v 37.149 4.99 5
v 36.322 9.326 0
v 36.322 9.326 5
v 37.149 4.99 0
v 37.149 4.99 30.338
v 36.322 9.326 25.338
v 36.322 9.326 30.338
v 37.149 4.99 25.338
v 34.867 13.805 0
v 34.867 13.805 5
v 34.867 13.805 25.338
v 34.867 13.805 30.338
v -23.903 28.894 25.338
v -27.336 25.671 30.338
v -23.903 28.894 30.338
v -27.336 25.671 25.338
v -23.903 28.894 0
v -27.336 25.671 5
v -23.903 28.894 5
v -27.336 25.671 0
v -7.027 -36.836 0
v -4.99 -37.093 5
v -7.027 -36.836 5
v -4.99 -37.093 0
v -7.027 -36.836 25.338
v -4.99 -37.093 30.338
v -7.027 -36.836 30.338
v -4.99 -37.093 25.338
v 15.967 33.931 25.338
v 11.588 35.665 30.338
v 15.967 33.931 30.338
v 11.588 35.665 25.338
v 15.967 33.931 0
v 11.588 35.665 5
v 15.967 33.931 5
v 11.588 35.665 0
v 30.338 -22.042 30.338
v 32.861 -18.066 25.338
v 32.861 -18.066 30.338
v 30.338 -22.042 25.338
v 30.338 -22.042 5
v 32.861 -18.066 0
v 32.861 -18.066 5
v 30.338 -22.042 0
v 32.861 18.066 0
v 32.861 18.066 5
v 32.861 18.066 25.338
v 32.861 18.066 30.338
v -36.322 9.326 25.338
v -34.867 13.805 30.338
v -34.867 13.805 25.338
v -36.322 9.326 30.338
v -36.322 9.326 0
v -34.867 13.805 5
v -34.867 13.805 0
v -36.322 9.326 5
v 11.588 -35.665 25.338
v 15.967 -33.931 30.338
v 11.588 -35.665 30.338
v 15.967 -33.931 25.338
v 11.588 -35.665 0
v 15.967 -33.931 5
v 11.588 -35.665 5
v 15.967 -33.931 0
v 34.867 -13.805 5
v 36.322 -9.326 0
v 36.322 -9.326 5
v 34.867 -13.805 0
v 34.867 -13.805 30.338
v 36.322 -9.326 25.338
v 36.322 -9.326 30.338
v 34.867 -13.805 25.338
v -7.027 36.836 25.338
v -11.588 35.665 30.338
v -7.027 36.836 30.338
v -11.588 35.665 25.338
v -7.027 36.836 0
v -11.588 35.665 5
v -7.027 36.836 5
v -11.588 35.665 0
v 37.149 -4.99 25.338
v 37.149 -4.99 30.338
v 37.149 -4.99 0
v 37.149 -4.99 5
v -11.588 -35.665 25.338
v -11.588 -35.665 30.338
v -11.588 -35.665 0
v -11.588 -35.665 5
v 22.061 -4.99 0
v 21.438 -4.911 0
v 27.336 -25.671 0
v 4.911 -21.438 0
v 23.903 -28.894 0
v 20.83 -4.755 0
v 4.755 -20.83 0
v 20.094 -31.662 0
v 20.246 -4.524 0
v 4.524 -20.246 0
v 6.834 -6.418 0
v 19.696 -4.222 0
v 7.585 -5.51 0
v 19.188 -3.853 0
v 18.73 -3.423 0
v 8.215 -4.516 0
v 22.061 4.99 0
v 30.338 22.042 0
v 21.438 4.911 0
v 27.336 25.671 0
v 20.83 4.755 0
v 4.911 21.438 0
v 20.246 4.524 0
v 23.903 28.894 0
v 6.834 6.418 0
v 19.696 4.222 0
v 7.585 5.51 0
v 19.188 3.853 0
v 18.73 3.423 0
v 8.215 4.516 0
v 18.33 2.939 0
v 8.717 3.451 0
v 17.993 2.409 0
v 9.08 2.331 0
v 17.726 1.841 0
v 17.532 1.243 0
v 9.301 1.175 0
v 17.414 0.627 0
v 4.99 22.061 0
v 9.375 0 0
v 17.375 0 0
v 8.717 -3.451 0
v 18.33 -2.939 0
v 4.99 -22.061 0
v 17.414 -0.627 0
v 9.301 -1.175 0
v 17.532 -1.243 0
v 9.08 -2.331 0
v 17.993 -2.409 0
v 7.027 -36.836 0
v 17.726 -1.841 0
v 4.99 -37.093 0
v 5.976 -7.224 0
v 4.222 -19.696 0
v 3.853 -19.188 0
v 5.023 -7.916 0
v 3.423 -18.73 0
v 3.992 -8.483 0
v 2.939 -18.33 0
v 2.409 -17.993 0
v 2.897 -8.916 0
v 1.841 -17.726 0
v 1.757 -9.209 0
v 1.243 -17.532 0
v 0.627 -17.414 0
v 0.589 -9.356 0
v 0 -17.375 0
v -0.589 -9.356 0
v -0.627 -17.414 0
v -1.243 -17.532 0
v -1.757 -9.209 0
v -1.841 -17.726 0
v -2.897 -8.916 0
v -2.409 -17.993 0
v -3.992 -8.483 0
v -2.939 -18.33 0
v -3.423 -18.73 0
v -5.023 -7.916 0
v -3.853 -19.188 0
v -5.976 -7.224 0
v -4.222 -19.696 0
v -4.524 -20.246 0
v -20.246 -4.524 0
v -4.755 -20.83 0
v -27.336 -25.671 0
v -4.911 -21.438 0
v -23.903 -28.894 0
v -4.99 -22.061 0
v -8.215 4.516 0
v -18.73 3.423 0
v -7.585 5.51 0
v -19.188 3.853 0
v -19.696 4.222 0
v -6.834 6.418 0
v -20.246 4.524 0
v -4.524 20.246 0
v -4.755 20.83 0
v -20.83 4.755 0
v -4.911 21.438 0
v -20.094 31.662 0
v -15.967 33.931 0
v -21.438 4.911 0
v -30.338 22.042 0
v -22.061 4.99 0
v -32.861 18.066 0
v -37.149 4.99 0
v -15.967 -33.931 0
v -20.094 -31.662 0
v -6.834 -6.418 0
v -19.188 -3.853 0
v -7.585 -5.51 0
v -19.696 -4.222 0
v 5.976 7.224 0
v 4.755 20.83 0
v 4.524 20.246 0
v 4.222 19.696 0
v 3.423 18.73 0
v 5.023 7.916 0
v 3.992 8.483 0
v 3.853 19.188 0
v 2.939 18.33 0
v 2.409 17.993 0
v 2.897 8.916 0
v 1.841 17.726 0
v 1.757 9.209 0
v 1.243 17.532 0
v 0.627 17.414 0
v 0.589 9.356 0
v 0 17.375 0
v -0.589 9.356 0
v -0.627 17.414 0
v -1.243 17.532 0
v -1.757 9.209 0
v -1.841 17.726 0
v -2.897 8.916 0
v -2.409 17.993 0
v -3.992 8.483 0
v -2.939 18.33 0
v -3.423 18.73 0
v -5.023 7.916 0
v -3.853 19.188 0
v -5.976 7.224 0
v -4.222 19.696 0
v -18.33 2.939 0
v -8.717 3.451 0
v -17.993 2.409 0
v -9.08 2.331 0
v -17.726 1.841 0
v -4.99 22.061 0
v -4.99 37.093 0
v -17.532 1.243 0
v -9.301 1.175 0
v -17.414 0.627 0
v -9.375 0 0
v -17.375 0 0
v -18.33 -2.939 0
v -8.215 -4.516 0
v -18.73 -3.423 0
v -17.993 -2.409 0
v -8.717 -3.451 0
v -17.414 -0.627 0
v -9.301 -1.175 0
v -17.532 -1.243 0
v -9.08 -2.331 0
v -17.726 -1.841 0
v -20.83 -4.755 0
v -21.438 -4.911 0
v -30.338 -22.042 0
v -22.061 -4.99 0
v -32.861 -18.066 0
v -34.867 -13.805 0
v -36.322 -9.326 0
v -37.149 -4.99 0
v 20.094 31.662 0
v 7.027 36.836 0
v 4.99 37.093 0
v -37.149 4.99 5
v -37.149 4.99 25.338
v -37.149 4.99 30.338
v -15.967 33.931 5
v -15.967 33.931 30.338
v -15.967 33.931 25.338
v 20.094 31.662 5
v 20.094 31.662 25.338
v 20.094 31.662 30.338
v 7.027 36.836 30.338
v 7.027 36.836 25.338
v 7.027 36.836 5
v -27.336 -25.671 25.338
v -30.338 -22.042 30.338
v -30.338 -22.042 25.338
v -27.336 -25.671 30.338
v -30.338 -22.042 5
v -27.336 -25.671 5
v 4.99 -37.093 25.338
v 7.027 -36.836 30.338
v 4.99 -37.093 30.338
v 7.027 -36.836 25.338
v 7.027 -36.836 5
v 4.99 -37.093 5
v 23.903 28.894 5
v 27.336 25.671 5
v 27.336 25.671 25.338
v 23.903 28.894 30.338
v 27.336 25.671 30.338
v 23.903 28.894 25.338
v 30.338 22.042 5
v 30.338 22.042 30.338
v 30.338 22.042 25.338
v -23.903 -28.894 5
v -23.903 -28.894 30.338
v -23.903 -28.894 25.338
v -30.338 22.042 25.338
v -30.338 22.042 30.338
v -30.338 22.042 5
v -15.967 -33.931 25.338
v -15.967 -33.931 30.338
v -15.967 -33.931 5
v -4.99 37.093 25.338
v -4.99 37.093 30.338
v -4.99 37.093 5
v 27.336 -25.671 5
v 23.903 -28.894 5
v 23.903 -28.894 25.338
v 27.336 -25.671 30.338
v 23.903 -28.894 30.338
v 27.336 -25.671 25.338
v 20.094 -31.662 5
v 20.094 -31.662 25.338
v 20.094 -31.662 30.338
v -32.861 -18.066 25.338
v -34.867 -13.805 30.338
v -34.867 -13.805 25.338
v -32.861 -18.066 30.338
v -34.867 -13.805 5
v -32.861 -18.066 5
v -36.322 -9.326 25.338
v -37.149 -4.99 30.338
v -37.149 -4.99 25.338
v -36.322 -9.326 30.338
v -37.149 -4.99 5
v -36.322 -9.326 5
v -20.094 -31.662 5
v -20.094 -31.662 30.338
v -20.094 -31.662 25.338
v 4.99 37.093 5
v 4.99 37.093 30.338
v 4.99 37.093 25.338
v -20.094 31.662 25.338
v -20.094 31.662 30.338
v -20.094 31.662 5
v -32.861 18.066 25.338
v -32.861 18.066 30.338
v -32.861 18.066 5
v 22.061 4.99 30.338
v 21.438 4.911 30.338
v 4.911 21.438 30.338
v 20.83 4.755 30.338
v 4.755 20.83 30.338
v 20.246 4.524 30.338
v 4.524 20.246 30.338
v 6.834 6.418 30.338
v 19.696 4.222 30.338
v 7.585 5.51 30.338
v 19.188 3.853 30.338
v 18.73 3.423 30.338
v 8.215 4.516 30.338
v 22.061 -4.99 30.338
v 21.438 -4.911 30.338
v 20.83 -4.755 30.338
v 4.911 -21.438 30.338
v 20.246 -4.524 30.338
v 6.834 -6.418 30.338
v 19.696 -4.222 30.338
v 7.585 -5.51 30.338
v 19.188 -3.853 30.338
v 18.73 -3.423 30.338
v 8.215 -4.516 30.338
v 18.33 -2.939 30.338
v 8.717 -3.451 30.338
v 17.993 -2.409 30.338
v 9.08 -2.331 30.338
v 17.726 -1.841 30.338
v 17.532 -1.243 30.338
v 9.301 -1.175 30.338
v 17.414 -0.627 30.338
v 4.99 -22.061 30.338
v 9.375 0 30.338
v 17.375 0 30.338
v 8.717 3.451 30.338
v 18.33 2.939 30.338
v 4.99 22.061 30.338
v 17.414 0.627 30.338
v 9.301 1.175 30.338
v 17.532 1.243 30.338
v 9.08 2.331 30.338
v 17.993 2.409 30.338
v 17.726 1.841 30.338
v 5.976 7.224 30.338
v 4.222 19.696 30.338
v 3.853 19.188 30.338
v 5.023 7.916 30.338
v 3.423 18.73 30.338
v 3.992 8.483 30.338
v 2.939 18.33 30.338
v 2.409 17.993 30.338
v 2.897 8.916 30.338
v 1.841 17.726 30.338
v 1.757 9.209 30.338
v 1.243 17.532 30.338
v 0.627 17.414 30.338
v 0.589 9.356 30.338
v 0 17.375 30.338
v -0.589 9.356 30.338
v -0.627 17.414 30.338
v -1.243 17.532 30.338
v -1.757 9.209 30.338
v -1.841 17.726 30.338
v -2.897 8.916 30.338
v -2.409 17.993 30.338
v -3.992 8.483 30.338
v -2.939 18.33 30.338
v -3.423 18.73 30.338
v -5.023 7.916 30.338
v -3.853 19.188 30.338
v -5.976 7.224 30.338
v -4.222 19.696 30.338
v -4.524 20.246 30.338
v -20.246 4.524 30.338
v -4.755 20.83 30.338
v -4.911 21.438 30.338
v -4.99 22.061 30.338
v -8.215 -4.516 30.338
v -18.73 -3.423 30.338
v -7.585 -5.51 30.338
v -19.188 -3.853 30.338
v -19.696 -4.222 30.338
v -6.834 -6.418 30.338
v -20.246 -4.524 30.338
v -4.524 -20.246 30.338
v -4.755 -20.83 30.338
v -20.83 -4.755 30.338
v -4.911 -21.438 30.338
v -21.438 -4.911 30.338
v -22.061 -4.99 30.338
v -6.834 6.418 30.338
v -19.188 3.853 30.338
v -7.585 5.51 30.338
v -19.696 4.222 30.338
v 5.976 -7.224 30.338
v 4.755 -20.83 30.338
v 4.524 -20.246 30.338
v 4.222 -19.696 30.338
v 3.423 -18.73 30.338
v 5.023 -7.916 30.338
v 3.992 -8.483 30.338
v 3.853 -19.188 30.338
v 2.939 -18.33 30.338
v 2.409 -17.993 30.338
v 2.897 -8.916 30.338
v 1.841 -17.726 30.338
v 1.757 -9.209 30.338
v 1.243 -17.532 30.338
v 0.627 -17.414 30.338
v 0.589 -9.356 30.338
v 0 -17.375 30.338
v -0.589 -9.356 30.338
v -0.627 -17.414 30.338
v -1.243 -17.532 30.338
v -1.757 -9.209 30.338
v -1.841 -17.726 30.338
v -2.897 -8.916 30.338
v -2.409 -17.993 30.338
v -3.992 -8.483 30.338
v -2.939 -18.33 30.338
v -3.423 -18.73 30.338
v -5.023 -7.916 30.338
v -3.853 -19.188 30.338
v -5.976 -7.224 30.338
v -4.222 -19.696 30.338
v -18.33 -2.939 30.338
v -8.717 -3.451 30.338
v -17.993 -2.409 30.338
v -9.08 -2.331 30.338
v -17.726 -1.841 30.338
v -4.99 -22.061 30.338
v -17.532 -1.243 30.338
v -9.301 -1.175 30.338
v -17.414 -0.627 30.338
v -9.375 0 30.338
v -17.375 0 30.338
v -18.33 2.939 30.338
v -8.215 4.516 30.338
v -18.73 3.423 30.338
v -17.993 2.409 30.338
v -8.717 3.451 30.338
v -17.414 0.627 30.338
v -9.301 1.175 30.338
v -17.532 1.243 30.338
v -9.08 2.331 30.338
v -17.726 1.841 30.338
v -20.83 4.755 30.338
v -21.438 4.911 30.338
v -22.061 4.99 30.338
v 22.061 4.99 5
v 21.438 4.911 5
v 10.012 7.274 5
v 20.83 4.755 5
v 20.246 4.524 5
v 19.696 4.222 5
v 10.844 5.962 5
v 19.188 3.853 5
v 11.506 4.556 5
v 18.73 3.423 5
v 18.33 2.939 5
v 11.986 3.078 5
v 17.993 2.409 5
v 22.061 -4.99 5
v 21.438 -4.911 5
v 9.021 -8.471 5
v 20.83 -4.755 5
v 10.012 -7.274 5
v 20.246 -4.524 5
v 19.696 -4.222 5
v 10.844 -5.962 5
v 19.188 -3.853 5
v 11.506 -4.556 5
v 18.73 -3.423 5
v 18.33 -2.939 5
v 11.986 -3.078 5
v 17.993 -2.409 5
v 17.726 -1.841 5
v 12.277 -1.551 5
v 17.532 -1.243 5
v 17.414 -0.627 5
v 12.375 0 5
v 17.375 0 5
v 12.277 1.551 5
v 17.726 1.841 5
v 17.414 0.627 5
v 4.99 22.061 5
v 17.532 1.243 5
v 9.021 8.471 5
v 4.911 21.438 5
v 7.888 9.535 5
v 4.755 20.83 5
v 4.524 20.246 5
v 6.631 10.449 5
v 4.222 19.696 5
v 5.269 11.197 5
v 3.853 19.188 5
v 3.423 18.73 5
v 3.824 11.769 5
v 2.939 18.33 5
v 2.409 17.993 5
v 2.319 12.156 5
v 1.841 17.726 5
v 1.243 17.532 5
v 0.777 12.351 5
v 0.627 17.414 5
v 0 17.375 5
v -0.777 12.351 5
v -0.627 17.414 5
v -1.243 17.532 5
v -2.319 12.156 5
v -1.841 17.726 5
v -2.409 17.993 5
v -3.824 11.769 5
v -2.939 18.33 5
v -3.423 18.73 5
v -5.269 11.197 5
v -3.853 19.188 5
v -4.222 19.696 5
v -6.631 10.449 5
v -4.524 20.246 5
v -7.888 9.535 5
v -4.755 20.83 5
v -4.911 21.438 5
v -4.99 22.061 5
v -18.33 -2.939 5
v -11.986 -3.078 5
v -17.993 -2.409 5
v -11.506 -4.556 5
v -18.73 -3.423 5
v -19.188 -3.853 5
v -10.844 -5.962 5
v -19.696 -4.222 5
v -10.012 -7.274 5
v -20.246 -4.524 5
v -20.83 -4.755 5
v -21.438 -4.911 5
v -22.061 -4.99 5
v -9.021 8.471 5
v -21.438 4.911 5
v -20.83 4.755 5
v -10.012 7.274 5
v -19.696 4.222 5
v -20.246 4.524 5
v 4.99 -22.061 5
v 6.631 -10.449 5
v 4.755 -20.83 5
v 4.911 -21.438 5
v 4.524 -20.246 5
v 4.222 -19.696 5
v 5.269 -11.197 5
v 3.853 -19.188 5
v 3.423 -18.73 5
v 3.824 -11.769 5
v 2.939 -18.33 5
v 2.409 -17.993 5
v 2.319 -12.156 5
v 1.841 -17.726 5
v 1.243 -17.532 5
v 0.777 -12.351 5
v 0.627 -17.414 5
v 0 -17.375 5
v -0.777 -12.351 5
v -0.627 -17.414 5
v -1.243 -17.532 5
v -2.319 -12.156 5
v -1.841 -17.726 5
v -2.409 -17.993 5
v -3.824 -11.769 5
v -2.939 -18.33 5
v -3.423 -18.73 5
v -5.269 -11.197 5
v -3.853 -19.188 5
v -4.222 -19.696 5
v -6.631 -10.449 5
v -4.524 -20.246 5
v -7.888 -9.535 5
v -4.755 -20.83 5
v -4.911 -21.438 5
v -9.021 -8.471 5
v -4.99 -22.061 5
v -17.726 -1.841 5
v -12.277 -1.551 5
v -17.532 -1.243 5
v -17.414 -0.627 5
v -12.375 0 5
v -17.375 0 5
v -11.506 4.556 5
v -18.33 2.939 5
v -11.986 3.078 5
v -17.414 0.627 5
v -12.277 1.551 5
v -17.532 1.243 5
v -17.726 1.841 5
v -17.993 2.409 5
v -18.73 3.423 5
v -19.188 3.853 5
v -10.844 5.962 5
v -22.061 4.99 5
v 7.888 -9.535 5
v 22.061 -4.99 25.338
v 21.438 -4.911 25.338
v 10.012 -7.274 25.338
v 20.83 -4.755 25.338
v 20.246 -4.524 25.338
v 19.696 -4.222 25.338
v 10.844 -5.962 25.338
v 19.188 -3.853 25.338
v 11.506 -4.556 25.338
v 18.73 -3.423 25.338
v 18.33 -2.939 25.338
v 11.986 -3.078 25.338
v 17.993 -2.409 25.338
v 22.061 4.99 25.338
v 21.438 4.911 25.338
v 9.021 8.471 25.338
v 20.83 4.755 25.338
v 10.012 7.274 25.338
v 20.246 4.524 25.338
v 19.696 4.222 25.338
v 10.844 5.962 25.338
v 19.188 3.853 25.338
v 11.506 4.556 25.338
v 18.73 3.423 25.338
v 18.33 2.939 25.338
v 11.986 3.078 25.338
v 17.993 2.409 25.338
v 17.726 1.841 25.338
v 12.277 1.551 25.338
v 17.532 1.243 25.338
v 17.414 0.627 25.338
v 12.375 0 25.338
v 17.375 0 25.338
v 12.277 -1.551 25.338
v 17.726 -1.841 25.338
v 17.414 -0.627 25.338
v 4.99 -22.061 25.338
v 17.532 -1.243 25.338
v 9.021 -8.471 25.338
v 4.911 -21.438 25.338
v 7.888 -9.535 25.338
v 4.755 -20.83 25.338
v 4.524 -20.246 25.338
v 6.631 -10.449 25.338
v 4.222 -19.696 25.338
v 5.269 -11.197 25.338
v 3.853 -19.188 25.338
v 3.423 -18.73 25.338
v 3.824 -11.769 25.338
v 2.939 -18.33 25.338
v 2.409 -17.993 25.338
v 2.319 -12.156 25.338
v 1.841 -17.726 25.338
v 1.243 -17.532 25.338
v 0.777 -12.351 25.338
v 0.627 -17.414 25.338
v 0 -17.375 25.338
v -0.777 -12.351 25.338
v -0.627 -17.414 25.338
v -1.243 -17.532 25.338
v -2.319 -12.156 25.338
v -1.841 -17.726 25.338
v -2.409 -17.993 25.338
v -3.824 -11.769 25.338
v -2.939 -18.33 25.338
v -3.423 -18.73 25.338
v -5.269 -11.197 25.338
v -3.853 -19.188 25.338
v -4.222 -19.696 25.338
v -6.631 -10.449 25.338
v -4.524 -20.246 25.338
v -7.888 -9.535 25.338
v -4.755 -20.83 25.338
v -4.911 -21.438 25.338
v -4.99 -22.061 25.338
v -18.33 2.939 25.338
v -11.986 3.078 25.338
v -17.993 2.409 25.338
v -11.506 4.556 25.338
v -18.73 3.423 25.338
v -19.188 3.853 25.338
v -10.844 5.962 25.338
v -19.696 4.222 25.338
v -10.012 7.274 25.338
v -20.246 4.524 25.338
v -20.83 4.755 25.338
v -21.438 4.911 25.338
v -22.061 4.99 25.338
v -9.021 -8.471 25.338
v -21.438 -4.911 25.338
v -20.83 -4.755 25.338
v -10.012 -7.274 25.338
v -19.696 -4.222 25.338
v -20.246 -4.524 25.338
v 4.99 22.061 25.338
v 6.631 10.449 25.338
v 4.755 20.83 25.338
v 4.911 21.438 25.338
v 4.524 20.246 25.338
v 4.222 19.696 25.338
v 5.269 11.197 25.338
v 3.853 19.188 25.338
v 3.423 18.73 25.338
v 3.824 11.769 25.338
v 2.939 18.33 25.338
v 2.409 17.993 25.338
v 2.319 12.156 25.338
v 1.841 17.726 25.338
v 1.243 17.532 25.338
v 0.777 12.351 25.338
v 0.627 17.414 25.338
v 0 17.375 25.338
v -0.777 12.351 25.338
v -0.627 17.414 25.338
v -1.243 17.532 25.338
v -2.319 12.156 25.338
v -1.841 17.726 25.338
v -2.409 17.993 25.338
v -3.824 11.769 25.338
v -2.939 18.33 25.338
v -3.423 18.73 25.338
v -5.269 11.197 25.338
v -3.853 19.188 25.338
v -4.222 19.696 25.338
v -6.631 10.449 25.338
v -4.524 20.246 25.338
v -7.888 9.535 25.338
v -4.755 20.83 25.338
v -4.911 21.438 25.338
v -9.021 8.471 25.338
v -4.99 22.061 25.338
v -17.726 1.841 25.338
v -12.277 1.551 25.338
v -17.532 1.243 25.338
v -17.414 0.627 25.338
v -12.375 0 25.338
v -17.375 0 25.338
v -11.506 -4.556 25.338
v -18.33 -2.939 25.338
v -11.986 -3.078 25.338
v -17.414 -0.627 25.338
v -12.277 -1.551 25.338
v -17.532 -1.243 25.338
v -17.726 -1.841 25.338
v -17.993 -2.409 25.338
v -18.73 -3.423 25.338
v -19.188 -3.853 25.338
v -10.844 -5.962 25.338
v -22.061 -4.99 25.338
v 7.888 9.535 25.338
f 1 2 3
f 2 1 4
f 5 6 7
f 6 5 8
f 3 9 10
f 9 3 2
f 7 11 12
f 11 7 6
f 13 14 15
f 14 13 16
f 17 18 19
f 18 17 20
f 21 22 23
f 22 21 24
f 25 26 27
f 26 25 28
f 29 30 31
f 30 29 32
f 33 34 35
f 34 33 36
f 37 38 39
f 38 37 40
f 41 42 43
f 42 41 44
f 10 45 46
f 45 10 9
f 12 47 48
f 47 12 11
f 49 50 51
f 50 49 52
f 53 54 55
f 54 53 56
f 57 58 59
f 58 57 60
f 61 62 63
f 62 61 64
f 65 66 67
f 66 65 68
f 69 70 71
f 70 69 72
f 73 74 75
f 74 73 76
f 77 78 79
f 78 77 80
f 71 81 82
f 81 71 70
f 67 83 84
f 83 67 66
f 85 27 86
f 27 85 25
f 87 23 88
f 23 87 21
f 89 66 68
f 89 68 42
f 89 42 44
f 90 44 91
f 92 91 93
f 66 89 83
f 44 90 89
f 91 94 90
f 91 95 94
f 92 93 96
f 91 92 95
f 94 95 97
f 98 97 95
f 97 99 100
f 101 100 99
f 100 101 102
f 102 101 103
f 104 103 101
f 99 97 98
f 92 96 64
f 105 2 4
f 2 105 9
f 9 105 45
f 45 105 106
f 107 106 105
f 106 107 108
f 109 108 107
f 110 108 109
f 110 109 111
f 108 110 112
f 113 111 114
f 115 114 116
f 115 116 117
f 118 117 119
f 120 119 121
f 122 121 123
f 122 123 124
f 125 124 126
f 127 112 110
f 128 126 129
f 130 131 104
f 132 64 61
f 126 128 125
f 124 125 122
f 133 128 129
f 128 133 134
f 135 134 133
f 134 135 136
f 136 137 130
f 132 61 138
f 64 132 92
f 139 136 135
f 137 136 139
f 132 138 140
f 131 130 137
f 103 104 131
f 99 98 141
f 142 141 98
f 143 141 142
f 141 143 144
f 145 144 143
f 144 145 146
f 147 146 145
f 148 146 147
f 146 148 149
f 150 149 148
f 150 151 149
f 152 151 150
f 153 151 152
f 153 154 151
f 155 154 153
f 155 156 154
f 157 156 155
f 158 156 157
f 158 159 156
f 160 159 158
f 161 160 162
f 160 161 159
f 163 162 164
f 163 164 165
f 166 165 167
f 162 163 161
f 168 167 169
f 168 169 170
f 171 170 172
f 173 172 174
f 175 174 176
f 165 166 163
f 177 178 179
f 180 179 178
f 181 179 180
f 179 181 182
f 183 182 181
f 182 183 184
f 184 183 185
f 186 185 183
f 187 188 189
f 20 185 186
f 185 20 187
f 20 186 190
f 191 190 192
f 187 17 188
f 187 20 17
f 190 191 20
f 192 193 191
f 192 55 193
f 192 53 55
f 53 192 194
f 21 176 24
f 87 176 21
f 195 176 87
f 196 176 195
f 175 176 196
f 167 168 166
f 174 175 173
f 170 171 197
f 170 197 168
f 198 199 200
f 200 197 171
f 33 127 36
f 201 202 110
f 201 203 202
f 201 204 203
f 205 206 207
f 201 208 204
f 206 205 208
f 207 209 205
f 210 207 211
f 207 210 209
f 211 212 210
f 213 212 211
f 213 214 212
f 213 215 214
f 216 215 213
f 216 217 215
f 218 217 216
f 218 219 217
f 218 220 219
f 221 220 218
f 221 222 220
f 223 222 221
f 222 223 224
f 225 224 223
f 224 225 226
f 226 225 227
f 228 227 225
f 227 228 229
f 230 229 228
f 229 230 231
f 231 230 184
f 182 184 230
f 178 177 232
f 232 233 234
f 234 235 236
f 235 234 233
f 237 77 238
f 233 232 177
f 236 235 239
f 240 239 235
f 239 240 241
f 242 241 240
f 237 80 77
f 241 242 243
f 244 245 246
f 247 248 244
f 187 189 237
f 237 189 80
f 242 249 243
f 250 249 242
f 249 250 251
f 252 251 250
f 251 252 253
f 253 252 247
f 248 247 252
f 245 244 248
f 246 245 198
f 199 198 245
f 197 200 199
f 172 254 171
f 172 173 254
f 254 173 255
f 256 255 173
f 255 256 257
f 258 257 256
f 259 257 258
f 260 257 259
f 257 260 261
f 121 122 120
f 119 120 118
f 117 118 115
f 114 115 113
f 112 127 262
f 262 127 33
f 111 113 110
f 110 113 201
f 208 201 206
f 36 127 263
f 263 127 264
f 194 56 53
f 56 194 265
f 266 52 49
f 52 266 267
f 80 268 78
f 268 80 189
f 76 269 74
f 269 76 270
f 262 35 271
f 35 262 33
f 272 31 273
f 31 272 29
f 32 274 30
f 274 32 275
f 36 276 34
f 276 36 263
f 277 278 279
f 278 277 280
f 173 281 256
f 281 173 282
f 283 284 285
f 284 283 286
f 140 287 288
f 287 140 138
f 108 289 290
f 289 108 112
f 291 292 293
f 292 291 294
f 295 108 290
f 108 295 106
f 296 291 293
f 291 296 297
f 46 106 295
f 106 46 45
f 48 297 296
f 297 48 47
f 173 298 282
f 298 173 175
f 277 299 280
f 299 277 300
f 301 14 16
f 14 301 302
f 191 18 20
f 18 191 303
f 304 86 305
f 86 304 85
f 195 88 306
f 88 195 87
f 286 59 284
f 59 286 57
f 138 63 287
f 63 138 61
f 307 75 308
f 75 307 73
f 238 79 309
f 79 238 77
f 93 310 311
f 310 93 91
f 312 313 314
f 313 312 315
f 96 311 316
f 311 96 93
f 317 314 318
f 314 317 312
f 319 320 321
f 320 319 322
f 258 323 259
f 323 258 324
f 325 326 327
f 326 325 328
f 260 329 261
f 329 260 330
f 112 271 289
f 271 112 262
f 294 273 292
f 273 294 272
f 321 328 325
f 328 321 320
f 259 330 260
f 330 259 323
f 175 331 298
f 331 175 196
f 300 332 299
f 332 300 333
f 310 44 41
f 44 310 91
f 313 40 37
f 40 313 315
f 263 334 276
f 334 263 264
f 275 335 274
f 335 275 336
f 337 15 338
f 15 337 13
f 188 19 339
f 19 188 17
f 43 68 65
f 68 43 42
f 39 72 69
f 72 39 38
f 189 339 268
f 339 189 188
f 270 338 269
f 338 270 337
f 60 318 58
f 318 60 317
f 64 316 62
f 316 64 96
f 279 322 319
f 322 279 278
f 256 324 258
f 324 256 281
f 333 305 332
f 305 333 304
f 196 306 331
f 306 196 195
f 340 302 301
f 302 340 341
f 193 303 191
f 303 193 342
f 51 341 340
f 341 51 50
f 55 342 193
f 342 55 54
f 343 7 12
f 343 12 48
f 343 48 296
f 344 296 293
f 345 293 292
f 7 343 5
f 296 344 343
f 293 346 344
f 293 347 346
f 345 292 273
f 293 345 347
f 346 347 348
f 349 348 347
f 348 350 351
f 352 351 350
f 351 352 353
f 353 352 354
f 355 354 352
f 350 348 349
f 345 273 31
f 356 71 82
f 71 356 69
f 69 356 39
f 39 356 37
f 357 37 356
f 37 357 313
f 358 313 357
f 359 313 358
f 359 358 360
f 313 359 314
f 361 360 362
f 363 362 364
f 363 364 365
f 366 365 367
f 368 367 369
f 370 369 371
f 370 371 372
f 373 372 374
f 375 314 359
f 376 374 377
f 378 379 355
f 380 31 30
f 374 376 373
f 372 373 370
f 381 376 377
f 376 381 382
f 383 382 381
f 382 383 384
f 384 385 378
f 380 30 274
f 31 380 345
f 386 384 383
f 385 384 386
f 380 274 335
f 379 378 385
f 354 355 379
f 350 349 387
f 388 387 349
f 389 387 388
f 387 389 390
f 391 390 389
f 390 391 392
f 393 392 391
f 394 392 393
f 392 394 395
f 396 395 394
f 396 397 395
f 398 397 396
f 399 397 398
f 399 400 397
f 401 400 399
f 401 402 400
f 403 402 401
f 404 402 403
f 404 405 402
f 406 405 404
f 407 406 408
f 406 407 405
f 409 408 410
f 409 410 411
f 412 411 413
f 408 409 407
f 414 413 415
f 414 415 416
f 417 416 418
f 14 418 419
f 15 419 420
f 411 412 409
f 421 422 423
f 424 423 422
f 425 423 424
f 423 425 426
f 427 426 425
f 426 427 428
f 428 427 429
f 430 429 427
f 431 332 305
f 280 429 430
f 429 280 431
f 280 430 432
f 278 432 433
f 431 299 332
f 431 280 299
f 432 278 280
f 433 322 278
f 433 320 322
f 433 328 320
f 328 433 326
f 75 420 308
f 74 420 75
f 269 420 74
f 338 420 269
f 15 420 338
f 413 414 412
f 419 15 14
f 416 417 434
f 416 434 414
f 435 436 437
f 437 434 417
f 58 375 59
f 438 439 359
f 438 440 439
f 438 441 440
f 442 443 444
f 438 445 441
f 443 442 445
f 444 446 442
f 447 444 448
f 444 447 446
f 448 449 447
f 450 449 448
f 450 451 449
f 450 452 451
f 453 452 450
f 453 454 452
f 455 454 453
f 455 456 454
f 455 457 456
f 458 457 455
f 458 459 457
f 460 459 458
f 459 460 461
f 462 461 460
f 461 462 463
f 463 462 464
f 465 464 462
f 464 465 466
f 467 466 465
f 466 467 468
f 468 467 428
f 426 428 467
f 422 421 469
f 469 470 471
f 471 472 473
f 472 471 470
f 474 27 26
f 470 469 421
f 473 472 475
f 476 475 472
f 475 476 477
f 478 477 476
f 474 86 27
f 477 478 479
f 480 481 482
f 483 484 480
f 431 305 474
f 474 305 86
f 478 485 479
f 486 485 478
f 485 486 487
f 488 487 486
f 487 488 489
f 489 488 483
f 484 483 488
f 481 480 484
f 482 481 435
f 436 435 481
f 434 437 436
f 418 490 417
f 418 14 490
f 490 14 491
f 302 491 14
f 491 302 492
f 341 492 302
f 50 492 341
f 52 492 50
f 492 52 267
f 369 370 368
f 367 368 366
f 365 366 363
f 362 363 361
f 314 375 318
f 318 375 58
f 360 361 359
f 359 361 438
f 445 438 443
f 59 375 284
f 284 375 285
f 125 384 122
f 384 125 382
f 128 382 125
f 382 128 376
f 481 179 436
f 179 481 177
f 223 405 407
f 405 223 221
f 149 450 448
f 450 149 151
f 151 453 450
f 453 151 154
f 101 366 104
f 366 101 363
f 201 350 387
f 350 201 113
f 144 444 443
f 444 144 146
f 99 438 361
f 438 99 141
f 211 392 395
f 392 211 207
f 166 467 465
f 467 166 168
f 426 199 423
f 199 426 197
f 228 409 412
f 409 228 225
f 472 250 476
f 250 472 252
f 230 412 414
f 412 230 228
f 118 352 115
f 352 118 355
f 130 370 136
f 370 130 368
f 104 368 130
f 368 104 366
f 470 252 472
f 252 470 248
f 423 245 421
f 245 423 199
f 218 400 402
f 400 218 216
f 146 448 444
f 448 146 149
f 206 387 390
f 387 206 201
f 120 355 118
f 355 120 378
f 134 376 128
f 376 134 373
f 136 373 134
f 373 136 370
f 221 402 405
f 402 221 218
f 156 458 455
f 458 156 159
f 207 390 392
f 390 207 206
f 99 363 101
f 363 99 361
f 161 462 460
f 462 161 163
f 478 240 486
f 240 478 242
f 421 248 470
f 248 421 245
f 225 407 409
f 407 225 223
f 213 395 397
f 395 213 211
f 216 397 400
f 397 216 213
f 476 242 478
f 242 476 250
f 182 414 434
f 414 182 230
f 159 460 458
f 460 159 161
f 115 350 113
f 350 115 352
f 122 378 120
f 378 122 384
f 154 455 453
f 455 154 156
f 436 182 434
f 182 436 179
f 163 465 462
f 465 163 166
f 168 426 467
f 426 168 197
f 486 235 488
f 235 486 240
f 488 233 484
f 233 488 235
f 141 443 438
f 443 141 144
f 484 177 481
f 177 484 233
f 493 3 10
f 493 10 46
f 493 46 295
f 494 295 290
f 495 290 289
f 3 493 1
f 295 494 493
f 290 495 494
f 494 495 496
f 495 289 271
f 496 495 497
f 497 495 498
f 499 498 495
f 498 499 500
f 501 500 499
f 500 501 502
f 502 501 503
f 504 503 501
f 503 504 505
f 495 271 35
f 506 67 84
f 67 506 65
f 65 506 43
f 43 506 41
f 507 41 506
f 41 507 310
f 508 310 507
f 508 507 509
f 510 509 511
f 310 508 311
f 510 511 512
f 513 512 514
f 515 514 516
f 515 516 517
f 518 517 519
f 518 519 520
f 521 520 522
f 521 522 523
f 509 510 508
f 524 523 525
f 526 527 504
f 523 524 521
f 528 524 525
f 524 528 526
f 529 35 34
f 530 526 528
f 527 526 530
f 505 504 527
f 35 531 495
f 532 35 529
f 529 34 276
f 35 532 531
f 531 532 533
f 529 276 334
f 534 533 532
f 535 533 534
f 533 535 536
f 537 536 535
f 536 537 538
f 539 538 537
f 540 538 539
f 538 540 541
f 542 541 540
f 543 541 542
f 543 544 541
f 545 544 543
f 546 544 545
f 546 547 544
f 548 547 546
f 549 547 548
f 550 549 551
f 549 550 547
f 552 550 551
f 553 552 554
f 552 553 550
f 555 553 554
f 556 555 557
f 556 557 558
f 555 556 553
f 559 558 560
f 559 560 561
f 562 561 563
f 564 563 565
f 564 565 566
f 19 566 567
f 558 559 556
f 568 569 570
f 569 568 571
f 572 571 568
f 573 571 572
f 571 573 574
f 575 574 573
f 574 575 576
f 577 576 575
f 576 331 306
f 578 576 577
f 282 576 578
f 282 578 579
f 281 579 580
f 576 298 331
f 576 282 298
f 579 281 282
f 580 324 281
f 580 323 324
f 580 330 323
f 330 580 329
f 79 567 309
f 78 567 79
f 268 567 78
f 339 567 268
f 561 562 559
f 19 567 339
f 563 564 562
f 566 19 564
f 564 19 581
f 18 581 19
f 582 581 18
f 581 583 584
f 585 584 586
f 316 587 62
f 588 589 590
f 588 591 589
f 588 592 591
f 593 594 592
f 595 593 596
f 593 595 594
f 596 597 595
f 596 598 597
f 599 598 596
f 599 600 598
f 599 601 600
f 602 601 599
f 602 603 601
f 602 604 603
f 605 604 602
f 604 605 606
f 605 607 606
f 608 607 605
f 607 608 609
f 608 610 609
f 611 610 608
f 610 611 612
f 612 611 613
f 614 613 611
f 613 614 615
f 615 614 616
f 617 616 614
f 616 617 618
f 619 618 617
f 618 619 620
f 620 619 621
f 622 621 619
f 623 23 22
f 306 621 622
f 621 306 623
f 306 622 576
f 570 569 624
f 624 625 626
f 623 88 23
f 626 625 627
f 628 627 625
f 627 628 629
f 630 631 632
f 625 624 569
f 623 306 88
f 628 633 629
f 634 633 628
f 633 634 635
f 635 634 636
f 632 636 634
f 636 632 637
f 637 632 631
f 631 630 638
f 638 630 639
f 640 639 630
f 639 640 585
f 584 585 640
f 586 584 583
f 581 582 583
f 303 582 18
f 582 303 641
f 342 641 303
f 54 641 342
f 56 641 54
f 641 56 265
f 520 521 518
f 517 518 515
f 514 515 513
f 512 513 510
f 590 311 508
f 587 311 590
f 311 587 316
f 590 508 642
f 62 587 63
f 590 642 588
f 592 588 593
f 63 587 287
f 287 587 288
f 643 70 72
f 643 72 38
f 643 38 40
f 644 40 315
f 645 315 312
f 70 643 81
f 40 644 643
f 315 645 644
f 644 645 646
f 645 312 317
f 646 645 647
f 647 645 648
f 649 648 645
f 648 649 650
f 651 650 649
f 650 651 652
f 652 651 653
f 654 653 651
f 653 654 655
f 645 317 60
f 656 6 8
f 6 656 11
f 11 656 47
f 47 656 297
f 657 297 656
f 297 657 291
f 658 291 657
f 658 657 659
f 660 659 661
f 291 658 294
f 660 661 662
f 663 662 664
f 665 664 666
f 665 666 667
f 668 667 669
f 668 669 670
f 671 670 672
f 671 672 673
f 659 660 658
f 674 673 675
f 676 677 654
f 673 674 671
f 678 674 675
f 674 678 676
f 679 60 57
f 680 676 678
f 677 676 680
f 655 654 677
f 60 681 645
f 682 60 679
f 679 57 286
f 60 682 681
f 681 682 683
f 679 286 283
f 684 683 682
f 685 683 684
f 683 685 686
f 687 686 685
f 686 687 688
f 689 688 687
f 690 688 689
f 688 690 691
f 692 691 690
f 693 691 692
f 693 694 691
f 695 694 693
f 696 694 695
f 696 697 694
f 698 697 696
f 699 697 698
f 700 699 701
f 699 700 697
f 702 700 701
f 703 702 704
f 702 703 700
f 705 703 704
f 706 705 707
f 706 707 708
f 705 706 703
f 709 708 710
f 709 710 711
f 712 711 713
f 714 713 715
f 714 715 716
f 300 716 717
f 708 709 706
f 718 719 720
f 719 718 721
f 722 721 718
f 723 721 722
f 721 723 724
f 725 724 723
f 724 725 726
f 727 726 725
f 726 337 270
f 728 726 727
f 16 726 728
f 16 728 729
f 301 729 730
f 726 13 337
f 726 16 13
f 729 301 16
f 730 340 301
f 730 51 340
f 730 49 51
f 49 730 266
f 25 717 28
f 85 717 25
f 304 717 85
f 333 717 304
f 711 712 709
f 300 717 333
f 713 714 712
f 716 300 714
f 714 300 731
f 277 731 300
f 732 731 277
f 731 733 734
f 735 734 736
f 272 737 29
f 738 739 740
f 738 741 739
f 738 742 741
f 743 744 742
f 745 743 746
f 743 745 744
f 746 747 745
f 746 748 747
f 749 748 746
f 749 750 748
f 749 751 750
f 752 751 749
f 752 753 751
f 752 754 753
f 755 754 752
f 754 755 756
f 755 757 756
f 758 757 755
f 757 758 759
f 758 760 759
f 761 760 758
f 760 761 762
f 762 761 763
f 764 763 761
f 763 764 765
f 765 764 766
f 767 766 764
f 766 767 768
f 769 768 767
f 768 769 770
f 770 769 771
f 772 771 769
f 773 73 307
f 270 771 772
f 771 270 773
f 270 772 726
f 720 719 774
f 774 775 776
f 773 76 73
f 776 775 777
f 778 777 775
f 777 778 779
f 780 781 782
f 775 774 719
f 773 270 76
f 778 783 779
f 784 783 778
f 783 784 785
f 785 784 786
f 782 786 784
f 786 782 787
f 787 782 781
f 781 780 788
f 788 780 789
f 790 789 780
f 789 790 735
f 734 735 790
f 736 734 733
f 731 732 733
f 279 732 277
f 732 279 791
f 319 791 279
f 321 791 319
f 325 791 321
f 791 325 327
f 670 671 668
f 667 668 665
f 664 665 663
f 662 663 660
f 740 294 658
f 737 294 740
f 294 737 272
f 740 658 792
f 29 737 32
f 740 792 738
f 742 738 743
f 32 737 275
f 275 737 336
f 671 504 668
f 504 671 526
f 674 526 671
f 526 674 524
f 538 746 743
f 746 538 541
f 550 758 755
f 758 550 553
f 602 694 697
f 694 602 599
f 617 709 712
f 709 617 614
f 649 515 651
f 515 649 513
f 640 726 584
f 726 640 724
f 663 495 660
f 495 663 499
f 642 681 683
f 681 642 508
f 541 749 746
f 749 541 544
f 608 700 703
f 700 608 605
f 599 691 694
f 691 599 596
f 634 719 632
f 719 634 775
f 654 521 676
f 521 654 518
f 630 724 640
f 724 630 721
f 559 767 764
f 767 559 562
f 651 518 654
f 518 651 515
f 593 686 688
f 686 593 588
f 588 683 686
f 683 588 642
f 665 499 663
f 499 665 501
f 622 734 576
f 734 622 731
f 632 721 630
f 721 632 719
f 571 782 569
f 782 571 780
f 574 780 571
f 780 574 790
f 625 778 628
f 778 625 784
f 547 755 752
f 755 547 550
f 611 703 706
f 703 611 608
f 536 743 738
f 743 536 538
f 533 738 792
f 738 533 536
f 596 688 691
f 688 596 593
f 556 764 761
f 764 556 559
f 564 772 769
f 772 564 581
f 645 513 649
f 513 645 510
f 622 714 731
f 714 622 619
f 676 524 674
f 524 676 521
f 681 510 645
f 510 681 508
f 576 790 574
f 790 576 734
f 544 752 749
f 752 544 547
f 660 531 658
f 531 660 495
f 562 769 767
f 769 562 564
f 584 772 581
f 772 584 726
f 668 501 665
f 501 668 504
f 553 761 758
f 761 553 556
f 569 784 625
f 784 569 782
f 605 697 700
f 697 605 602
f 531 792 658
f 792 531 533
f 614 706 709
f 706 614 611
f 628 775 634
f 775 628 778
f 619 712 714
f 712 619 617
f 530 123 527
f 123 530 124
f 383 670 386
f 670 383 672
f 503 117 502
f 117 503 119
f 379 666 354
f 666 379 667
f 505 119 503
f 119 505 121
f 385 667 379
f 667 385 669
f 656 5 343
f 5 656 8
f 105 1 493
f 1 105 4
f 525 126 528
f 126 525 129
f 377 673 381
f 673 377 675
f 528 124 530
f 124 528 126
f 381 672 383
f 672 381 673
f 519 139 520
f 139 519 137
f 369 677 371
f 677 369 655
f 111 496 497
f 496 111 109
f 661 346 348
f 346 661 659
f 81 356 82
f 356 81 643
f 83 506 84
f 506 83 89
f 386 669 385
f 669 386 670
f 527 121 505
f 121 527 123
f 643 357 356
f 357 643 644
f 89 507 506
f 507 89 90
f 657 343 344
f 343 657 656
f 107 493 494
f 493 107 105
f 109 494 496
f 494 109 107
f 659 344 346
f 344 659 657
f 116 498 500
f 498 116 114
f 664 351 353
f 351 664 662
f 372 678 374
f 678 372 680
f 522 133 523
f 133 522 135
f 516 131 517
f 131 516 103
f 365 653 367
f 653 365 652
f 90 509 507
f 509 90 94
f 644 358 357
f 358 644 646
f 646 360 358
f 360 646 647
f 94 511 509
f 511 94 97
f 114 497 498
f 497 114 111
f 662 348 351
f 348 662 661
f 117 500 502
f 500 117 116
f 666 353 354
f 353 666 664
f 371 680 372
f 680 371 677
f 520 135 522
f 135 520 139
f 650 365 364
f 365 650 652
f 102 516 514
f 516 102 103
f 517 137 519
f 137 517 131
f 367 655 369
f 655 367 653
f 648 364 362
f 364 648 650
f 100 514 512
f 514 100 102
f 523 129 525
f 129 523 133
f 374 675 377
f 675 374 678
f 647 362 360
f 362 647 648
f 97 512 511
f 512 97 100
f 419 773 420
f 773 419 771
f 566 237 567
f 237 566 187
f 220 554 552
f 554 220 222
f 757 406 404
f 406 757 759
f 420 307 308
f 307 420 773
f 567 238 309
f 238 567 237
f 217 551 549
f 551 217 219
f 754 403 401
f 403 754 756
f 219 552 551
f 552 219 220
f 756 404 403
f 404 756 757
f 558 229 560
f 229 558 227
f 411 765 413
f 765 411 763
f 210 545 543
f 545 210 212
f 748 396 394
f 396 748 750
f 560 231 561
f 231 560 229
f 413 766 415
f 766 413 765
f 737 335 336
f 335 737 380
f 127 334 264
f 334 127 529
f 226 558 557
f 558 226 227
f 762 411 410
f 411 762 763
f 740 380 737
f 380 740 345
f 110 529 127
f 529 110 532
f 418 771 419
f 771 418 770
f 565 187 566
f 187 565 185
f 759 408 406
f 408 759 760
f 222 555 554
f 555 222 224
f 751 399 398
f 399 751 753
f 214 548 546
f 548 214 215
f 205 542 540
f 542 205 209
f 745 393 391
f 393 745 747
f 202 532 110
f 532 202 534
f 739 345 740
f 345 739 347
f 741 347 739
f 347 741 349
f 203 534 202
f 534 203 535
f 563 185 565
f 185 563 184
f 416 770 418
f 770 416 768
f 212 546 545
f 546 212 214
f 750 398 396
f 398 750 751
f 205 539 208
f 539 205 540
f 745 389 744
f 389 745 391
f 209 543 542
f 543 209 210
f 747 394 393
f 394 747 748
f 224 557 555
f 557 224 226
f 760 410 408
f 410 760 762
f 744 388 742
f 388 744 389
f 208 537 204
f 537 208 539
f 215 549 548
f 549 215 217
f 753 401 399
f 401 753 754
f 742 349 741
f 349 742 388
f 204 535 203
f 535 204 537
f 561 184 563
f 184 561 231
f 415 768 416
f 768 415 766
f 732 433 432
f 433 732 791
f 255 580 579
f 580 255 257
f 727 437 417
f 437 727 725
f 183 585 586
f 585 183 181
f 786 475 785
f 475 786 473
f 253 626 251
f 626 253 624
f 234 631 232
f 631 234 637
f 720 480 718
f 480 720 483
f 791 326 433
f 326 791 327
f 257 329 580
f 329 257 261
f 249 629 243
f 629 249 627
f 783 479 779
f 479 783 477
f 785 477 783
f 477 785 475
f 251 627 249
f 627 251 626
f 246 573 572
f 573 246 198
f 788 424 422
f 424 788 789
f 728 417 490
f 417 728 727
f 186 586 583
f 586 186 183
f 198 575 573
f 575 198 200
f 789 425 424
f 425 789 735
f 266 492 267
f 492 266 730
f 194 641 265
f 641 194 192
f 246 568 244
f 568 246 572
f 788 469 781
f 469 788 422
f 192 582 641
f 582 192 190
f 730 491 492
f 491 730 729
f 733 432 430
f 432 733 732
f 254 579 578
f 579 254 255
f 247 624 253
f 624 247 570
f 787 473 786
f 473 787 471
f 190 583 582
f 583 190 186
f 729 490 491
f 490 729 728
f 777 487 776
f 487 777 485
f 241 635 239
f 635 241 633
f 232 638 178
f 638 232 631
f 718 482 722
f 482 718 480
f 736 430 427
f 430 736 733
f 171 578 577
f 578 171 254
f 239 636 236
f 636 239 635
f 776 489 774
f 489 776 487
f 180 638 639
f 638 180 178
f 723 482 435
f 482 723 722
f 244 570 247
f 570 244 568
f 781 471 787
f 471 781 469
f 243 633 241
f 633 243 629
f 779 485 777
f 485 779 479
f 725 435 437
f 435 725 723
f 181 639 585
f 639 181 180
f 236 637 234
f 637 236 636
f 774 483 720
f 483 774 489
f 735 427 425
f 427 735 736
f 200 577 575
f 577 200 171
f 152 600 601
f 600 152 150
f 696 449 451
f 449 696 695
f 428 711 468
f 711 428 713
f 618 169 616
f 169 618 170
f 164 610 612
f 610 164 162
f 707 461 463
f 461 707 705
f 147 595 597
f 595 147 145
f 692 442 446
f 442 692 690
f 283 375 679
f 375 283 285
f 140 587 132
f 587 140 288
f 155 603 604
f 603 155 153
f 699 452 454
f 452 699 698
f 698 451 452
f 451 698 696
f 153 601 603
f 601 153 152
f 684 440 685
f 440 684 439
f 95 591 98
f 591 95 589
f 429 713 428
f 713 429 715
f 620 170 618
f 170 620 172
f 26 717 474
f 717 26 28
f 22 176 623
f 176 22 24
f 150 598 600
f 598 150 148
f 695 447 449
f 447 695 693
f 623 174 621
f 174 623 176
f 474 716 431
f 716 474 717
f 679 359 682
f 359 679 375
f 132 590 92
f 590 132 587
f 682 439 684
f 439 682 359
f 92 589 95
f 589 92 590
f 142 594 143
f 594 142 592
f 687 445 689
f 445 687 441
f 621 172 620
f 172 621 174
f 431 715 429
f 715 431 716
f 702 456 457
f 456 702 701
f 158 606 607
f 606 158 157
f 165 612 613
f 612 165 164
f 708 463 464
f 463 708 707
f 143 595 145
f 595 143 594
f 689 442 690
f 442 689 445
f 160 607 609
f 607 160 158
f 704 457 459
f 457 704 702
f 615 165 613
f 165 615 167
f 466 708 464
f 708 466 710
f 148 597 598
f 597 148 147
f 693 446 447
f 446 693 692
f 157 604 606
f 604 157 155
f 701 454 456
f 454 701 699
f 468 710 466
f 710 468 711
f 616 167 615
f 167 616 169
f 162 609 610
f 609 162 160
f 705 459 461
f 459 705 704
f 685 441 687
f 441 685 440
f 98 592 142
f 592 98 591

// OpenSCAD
$fn = 50;

od = 75;
id = od/4;


spool_wall_thickness=3;
outer_spool_thickness=10;

cable_tie_thickness=10;

cable_tie_offset_from_inner_spool = 10;

part_height = id*1.61803398875;

module ring(inner,outer,height) {
    difference() {
        echo("Making a ring with od of ");
        echo(outer);
        echo(" and an inner diameter of ");
        echo(inner);
        cylinder(r=outer, h=height);
        cylinder(r=inner, h=height);

    }
}



module cable_tie_holes1() {
    echo("cutting inner holes for cable ties");
    for(a = [0:90:359]) {
        rotate([0,0,a])
        {
            translate([id/2+spool_wall_thickness+cable_tie_offset_from_inner_spool,0,0]) {
                hull() {
                    cylinder(r=cable_tie_thickness/2,part_height);
                    translate([cable_tie_thickness,0,0]) cylinder(r=cable_tie_thickness/2,part_height);
                    translate([cable_tie_thickness*2,0,0]) cylinder(r=cable_tie_thickness/2,part_height);
                }
            }
        }
    }
}

module ring1(){
        echo("Creating outside spool primitive");
        ring(id/2,od/2,part_height);
}

module ring2() {
        echo("Creating cut cylinder to hollow out spool");
        translate([0,0,outer_spool_thickness/2]) {
            ring(
                id/2+spool_wall_thickness,
                od*2,
                part_height-outer_spool_thickness);
    }
}

difference() {
    difference(){
        color([1,0,0]) ring1();
        color([0,1,0]) ring2();

    }
    color([0,0,1]) cable_tie_holes1();
}
//color([1,0,0]) ring1();
//color([0,1,0]) ring2();
